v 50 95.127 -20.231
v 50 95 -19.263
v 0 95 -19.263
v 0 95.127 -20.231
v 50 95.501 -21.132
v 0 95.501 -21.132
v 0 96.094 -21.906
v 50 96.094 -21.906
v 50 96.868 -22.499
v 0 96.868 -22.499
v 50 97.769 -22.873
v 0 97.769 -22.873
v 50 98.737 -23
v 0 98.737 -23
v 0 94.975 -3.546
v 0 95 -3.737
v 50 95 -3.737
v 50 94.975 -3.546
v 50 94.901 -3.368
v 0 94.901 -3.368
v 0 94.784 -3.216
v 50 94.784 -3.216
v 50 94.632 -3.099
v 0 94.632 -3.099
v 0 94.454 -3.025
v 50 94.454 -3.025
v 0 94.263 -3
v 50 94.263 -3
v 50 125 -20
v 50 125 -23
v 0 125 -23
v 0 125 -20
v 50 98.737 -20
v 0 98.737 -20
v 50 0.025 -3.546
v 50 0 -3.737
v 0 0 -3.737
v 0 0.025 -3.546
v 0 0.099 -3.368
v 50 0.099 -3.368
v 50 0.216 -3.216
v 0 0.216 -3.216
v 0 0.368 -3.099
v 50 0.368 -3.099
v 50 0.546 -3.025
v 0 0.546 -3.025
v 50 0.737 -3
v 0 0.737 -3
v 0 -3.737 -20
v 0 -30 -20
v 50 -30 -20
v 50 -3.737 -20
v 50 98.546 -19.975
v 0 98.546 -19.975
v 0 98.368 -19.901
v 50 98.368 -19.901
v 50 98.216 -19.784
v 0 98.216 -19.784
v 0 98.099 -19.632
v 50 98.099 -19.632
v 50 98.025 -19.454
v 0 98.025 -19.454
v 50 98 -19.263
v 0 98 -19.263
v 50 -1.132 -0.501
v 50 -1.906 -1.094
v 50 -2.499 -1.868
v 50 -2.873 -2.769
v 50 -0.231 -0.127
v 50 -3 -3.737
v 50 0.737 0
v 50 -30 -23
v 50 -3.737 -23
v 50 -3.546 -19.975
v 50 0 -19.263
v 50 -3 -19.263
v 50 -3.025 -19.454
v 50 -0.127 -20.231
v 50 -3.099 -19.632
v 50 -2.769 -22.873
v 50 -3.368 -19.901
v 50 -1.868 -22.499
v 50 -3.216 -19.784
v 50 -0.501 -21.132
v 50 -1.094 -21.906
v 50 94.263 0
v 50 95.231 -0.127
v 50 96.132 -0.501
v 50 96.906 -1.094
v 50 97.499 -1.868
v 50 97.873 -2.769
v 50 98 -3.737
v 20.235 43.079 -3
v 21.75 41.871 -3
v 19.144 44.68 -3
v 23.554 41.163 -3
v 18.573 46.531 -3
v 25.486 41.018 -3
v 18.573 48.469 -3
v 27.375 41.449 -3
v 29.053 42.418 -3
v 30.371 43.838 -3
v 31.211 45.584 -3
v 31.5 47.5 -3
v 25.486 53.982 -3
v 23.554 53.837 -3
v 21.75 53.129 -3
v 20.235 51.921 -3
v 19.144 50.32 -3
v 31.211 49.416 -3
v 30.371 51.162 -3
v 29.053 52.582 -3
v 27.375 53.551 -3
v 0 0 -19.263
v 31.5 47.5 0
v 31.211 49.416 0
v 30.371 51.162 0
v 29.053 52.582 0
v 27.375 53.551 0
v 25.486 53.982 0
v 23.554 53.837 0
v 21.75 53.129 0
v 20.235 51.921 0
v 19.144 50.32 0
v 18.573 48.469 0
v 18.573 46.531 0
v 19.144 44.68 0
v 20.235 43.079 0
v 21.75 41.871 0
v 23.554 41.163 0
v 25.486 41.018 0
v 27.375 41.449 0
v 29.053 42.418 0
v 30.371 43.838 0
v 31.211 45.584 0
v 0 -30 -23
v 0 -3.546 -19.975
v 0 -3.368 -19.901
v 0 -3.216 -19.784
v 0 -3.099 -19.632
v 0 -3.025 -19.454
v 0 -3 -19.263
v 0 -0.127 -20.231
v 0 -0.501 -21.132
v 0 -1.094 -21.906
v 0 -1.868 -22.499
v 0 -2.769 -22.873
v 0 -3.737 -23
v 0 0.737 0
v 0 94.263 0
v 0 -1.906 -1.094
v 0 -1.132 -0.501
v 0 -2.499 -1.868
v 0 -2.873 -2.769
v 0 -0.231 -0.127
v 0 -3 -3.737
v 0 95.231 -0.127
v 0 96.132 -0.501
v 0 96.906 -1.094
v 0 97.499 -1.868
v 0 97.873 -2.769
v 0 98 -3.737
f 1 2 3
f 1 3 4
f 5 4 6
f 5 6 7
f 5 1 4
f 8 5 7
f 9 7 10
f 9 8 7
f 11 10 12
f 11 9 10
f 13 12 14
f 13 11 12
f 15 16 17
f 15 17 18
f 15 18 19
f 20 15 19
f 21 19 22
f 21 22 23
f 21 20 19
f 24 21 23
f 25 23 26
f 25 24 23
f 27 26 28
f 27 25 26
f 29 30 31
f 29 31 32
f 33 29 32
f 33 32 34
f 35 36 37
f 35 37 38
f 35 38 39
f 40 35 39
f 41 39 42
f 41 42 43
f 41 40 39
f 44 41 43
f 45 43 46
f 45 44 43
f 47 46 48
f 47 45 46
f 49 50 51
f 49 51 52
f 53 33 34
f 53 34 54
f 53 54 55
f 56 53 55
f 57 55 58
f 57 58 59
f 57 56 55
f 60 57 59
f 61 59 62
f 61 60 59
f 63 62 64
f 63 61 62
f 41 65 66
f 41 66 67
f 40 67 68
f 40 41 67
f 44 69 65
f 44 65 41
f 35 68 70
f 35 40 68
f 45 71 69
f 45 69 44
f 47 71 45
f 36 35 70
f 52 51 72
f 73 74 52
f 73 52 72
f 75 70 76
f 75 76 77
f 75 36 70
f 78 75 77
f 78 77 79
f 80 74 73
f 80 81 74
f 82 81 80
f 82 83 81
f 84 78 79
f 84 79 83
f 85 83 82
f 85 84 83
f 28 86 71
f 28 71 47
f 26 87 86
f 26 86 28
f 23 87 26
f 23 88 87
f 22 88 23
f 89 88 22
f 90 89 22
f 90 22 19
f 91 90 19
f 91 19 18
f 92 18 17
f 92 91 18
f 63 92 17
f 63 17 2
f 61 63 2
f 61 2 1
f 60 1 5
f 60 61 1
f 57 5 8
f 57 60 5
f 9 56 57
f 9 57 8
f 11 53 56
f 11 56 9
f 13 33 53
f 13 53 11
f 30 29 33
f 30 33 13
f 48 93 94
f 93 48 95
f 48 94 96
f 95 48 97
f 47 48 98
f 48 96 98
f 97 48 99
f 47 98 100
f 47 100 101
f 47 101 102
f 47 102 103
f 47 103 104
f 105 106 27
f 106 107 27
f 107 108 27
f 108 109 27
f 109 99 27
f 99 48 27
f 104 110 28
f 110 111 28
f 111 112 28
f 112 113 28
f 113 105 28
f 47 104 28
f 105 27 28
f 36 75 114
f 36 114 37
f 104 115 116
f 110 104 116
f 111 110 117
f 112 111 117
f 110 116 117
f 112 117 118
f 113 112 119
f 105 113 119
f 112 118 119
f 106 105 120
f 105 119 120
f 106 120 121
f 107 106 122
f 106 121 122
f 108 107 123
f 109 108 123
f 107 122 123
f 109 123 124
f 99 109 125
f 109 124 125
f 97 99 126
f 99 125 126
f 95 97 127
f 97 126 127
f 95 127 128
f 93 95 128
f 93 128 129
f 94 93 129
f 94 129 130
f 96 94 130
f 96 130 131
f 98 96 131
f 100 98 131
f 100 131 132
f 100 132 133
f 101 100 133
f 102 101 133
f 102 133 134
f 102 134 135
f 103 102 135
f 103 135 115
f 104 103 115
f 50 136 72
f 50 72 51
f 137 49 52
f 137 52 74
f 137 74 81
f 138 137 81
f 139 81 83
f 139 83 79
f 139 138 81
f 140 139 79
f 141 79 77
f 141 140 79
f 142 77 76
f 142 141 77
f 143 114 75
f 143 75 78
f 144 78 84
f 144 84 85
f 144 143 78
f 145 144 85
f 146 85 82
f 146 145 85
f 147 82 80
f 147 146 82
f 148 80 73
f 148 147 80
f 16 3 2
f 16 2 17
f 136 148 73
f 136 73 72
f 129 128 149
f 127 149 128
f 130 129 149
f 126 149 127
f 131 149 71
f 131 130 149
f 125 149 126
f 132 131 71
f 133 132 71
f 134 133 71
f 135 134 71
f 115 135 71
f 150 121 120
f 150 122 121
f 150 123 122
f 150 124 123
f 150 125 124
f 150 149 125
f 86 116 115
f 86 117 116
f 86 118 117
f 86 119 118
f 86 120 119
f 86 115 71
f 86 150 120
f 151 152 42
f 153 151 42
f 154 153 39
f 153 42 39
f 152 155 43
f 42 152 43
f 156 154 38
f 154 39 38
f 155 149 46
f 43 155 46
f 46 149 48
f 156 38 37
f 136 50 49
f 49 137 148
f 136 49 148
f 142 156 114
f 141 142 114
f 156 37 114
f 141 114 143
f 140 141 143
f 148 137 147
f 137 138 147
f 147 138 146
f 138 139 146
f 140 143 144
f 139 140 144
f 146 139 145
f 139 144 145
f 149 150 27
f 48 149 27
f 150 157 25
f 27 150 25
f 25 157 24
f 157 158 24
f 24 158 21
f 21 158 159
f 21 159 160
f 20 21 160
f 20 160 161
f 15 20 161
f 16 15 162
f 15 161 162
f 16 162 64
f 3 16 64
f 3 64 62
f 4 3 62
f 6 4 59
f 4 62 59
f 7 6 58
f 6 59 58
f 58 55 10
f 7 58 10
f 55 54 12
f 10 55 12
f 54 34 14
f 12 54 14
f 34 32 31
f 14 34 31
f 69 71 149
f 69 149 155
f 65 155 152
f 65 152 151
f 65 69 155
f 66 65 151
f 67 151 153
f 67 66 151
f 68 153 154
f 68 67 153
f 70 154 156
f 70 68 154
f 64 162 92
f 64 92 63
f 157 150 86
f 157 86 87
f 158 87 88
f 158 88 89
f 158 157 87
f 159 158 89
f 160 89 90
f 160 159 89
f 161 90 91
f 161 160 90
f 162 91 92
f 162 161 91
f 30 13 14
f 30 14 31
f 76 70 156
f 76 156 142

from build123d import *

# Parameters (mm, degrees)
SKETCH_1_W                         = 50
SKETCH_1_H                         = 95
SM_BASE_FLANGE_1_DEPTH             = 3
SM_EDGE_FLANGE_1_STRIP_W           = 13.4732
SM_EDGE_FLANGE_1_STRIP_H           = 3
SM_EDGE_FLANGE_1_STRIP_CUT_DEPTH   = 50
SM_EDGE_FLANGE_1_STRIP_2_W         = 13.4732
SM_EDGE_FLANGE_1_STRIP_2_H         = 3
SM_EDGE_FLANGE_1_STRIP_CUT_2_DEPTH = 50
SM_EDGE_FLANGE_1_DEPTH             = 50
SM_EDGE_FLANGE_1_BEND_DEPTH        = 50
SM_EDGE_FLANGE_2_STRIP_W           = 13.4732
SM_EDGE_FLANGE_2_STRIP_H           = 3
SM_EDGE_FLANGE_2_STRIP_CUT_DEPTH   = 50
SM_EDGE_FLANGE_2_STRIP_2_W         = 13.4732
SM_EDGE_FLANGE_2_STRIP_2_H         = 3
SM_EDGE_FLANGE_2_STRIP_CUT_2_DEPTH = 50
SM_EDGE_FLANGE_2_DEPTH             = 50
SM_EDGE_FLANGE_2_BEND_DEPTH        = 50
SKETCH_18_R                        = 6.5
CUT_EXTRUDE_1_DEPTH                = 137.579647093


# Sheet-metal steps are written as plain solids
with BuildPart() as part:
    # Sketch 1 → 基体-法兰1 (new body)
    with BuildSketch(Plane.XY):
        with Locations((25, 47.5)):
            Rectangle(SKETCH_1_W, SKETCH_1_H)
    extrude(amount=-SM_BASE_FLANGE_1_DEPTH)

    # 边线-法兰1 strip (across the edge) → 边线-法兰1 strip cut (cut)
    with BuildSketch(Plane(origin=(0, 95, -3), x_dir=(0, -1, 0), z_dir=(1, 0, 0))):
        with Locations((-6, -1.5)):
            Rectangle(SM_EDGE_FLANGE_1_STRIP_W, SM_EDGE_FLANGE_1_STRIP_H)
    extrude(amount=SM_EDGE_FLANGE_1_STRIP_CUT_DEPTH, mode=Mode.SUBTRACT)

    # 边线-法兰1 strip 2 (across the edge) → 边线-法兰1 strip cut 2 (cut)
    with BuildSketch(Plane(origin=(50, 0, -3), x_dir=(0, 1, 0), z_dir=(-1, 0, 0))):
        with Locations((-6, -1.5)):
            Rectangle(SM_EDGE_FLANGE_1_STRIP_2_W, SM_EDGE_FLANGE_1_STRIP_2_H)
    extrude(amount=SM_EDGE_FLANGE_1_STRIP_CUT_2_DEPTH, mode=Mode.SUBTRACT)

    # 边线-法兰1 section (across the edge) → 边线-法兰1 (add)
    with BuildSketch(Plane(origin=(0, 95, -3), x_dir=(0, -1, 0), z_dir=(1, 0, 0))):
        with BuildLine():
            Line((-3, 0.7366), (-3, 17))
            Line((-3, 17), (0, 17))
            Line((0, 17), (0, 0.7366))
            ThreePointArc((0, 0.7366), (0.215745145, 0.215745145), (0.7366, 0))
            Line((0.7366, 0), (0.7366, -3))
            ThreePointArc((0.7366, -3), (-1.905575199, -1.905575199), (-3, 0.7366))
        make_face()
    extrude(amount=SM_EDGE_FLANGE_1_DEPTH)

    # 边线-法兰1 section 2 (across the edge) → 边线-法兰1 bend (add)
    with BuildSketch(Plane(origin=(50, 0, -3), x_dir=(0, 1, 0), z_dir=(-1, 0, 0))):
        with BuildLine():
            Line((-3, 0.7366), (-3, 17))
            Line((-3, 17), (0, 17))
            Line((0, 17), (0, 0.7366))
            ThreePointArc((0, 0.7366), (0.215745145, 0.215745145), (0.7366, 0))
            Line((0.7366, 0), (0.7366, -3))
            ThreePointArc((0.7366, -3), (-1.905575199, -1.905575199), (-3, 0.7366))
        make_face()
    extrude(amount=SM_EDGE_FLANGE_1_BEND_DEPTH)

    # 边线-法兰2 strip (across the edge) → 边线-法兰2 strip cut (cut)
    with BuildSketch(Plane(origin=(0, -3, -20), x_dir=(0, 0, 1), z_dir=(1, 0, 0))):
        with Locations((-6, -1.5)):
            Rectangle(SM_EDGE_FLANGE_2_STRIP_W, SM_EDGE_FLANGE_2_STRIP_H)
    extrude(amount=SM_EDGE_FLANGE_2_STRIP_CUT_DEPTH, mode=Mode.SUBTRACT)

    # 边线-法兰2 strip 2 (across the edge) → 边线-法兰2 strip cut 2 (cut)
    with BuildSketch(Plane(origin=(50, 98, -20), x_dir=(0, 0, 1), z_dir=(-1, 0, 0))):
        with Locations((-6, -1.5)):
            Rectangle(SM_EDGE_FLANGE_2_STRIP_2_W, SM_EDGE_FLANGE_2_STRIP_2_H)
    extrude(amount=SM_EDGE_FLANGE_2_STRIP_CUT_2_DEPTH, mode=Mode.SUBTRACT)

    # 边线-法兰2 section (across the edge) → 边线-法兰2 (add)
    with BuildSketch(Plane(origin=(0, -3, -20), x_dir=(0, 0, 1), z_dir=(1, 0, 0))):
        with BuildLine():
            Line((-3, 0.7366), (-3, 27))
            Line((-3, 27), (0, 27))
            Line((0, 27), (0, 0.7366))
            ThreePointArc((0, 0.7366), (0.215745145, 0.215745145), (0.7366, 0))
            Line((0.7366, 0), (0.7366, -3))
            ThreePointArc((0.7366, -3), (-1.905575199, -1.905575199), (-3, 0.7366))
        make_face()
    extrude(amount=SM_EDGE_FLANGE_2_DEPTH)

    # 边线-法兰2 section 2 (across the edge) → 边线-法兰2 bend (add)
    with BuildSketch(Plane(origin=(50, 98, -20), x_dir=(0, 0, 1), z_dir=(-1, 0, 0))):
        with BuildLine():
            Line((-3, 0.7366), (-3, 27))
            Line((-3, 27), (0, 27))
            Line((0, 27), (0, 0.7366))
            ThreePointArc((0, 0.7366), (0.215745145, 0.215745145), (0.7366, 0))
            Line((0.7366, 0), (0.7366, -3))
            ThreePointArc((0.7366, -3), (-1.905575199, -1.905575199), (-3, 0.7366))
        make_face()
    extrude(amount=SM_EDGE_FLANGE_2_BEND_DEPTH)

    # 草图18 → 切除-拉伸1 (cut, through all)
    with BuildSketch(Plane.XY):
        with Locations((25, 47.5)):
            Circle(SKETCH_18_R)
    extrude(amount=-CUT_EXTRUDE_1_DEPTH, mode=Mode.SUBTRACT)


solid = part.part
